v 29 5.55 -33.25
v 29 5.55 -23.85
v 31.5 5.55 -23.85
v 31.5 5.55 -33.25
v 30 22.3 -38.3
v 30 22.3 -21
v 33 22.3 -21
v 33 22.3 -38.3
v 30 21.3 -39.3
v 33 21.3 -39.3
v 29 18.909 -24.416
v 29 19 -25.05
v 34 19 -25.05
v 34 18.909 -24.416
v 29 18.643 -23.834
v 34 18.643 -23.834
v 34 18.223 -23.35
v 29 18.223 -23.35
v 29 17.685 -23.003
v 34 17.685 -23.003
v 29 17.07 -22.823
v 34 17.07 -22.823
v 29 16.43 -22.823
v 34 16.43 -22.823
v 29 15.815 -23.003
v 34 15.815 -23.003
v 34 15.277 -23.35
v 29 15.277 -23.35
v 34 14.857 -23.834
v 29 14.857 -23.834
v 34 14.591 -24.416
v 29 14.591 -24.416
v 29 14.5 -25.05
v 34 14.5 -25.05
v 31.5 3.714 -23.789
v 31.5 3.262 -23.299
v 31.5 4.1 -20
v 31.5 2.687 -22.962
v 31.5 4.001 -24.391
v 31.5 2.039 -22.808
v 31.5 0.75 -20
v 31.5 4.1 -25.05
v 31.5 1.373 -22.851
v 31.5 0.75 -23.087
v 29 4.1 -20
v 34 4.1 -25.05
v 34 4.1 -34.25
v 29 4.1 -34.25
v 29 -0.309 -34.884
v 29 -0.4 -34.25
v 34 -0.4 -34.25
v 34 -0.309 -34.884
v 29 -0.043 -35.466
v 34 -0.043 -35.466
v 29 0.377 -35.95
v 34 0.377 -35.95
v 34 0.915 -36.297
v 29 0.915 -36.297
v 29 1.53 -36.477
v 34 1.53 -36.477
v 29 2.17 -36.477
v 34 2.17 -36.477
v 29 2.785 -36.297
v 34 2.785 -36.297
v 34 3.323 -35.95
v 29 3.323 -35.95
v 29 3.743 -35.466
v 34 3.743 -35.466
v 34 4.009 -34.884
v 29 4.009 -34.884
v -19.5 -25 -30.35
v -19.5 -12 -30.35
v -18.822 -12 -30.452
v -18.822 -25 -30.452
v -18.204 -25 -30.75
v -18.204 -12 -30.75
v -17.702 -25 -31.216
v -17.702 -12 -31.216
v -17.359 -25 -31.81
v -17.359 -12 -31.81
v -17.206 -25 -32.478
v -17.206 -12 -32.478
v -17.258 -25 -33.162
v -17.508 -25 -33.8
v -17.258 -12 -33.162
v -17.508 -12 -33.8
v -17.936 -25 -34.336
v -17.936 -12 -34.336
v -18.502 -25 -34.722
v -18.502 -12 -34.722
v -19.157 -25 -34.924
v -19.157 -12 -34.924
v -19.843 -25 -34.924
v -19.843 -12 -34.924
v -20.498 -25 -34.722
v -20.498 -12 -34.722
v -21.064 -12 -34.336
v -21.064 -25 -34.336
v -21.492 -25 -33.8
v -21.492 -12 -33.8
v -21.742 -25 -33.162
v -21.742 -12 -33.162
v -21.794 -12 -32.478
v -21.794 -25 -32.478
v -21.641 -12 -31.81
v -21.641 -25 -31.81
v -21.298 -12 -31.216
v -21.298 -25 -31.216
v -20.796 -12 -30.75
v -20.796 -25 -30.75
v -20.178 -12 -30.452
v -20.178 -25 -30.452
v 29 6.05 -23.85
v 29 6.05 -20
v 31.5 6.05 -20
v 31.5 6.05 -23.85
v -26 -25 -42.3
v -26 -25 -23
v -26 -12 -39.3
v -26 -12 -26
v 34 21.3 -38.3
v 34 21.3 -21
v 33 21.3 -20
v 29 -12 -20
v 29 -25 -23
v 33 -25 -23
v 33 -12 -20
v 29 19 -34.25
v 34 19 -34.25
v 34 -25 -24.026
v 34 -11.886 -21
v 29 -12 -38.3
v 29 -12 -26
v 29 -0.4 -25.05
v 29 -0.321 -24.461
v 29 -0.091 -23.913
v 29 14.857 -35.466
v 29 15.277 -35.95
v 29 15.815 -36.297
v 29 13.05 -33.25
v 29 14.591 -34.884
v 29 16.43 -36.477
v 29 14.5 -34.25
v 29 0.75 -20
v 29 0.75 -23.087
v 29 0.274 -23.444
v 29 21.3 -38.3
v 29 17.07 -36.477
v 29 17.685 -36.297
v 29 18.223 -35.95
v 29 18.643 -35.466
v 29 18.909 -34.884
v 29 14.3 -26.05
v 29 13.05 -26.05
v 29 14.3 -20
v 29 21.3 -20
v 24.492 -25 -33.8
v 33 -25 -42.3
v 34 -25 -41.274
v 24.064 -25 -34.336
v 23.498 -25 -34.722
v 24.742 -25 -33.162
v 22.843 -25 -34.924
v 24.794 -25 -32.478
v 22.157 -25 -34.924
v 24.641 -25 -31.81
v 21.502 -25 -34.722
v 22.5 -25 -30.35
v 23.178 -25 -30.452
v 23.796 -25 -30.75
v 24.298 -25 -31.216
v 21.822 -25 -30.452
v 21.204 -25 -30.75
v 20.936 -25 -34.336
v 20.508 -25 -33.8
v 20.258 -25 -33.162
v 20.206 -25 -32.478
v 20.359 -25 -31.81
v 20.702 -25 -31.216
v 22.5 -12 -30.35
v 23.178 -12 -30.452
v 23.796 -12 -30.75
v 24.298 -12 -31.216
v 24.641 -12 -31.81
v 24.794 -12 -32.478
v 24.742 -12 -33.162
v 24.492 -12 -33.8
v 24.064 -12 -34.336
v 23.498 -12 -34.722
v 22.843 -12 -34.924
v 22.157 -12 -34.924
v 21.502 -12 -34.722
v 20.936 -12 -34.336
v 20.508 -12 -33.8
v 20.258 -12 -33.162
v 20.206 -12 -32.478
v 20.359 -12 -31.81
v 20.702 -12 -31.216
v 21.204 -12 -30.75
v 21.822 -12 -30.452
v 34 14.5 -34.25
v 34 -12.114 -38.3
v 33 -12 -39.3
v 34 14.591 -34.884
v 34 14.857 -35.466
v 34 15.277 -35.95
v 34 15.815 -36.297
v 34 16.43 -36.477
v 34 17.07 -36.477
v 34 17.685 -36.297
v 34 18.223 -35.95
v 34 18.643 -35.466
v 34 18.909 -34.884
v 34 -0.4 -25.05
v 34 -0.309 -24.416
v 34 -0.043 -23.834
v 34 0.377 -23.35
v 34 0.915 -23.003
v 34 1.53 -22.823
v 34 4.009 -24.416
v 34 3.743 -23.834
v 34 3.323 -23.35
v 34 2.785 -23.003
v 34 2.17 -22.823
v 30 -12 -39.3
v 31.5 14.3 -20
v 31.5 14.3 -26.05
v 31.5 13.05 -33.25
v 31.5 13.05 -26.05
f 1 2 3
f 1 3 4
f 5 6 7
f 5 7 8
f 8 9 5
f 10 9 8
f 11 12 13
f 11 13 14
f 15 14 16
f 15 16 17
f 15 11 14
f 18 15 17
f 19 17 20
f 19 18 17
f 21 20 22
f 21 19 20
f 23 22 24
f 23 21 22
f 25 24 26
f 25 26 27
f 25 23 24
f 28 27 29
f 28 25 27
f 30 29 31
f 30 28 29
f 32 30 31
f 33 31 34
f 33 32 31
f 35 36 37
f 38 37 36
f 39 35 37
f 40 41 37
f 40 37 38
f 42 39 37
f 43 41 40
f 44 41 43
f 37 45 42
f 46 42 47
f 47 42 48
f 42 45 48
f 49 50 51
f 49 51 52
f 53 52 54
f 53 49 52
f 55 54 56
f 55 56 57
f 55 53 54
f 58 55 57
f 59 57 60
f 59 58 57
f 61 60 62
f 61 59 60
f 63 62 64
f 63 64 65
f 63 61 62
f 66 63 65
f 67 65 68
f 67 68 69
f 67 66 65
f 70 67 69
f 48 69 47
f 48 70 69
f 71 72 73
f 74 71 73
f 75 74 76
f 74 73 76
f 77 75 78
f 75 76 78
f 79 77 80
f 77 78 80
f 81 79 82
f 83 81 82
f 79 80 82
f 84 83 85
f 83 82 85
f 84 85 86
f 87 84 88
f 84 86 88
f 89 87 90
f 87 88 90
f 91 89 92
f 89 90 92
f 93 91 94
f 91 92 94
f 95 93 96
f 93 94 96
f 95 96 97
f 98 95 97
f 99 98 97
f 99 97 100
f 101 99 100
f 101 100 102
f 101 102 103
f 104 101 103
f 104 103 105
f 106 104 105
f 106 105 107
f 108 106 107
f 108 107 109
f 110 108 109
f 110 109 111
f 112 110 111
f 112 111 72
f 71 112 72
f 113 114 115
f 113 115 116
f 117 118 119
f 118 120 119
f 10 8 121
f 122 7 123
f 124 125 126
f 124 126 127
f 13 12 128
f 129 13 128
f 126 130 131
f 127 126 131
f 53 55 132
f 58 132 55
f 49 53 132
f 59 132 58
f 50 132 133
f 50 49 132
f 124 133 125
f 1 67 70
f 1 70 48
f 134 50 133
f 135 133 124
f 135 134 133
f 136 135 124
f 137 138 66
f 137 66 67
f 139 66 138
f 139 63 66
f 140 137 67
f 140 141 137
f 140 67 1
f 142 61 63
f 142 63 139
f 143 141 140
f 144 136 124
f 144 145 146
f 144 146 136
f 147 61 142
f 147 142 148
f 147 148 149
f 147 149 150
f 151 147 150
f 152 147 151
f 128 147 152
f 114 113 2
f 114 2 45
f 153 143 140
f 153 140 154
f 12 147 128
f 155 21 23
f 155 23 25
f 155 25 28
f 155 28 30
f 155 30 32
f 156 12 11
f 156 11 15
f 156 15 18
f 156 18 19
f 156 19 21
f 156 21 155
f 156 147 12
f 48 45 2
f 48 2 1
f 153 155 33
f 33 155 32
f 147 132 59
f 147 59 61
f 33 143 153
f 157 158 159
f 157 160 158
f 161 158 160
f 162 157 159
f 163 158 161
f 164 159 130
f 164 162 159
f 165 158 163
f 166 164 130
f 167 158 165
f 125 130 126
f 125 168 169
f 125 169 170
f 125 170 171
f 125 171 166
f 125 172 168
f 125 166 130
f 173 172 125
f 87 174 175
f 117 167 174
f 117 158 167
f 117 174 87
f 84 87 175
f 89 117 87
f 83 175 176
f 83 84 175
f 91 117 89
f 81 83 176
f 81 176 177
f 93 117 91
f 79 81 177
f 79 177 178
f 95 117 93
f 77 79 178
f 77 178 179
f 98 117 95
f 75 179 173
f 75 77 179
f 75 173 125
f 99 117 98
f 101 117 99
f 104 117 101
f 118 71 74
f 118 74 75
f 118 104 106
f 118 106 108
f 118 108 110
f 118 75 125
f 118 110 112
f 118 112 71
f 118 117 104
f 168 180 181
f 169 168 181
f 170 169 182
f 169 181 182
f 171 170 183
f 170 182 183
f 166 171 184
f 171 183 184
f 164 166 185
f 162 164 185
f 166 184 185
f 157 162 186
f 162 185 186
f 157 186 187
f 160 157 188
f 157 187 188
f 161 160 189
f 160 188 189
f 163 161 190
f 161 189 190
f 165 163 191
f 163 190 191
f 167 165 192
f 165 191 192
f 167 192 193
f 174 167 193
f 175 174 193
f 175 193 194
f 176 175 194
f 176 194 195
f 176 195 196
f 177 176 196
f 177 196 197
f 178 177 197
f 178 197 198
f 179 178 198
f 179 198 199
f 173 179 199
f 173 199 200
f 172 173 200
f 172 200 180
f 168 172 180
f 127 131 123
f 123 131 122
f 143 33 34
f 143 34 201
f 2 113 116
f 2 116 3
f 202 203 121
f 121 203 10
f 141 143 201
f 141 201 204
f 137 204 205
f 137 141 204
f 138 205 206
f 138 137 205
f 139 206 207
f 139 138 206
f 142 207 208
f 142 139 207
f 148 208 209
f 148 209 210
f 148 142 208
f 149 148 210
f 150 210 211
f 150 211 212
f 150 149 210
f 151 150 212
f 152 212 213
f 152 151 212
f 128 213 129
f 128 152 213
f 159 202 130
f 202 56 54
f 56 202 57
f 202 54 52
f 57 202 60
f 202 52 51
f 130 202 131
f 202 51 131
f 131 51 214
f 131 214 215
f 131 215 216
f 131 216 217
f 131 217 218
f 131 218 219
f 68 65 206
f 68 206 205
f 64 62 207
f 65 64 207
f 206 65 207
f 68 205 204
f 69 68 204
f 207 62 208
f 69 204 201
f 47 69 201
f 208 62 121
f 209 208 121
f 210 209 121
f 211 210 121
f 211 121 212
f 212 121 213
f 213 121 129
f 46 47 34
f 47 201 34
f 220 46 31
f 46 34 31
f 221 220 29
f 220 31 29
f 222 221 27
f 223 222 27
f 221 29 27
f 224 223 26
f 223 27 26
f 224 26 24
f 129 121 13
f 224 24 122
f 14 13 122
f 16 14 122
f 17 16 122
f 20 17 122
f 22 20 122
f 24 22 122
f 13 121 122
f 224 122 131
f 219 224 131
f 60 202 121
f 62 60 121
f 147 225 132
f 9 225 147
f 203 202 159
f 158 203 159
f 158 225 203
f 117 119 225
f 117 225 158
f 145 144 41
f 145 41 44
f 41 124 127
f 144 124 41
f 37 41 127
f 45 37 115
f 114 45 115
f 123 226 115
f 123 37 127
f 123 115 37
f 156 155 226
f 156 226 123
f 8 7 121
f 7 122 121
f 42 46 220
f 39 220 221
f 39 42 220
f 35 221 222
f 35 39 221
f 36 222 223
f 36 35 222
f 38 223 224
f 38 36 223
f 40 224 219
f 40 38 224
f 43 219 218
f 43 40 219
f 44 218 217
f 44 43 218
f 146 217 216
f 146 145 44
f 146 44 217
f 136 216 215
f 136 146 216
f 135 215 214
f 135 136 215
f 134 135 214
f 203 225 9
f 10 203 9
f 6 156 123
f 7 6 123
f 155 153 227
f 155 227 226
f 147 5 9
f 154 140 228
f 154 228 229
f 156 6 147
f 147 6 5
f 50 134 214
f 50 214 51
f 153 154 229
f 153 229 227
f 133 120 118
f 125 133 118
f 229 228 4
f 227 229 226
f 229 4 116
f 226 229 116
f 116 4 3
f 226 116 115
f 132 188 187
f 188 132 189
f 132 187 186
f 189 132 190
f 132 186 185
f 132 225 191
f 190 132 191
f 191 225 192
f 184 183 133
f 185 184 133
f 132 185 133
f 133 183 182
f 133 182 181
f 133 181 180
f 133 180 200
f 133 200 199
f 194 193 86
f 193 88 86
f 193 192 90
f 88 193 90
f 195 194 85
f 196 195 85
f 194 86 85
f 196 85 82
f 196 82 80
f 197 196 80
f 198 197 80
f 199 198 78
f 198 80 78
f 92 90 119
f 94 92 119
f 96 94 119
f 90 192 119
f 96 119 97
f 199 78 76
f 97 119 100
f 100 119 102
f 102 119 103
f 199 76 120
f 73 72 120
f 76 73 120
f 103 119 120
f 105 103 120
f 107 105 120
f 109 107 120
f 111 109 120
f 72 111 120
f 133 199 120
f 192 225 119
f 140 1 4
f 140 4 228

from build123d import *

# Parameters (mm, degrees)
PAD_DEPTH            = 55
SKETCH001_R          = 2.3
POCKET_DEPTH         = 13.001
PAD013_DEPTH         = 5
SKETCH023_W          = 7.25
SKETCH023_H          = 3.35
POCKET009_DEPTH      = 2.5
CHAMFER005_SIZE      = 1
BODY_PITCH_ANGLE     = 90
BODY_PLACEMENT_ANGLE = 90


with BuildPart() as part:
    # Sketch → Pad (new body)
    with BuildSketch(Plane.XZ):
        Polygon((0, 0), (19.3, 0), (16.3, 13), (3, 13), align=None)
    extrude(amount=PAD_DEPTH)

    # Sketch001 (on Face3 of Pad) → Pocket (cut, through all)
    with BuildSketch(Plane(origin=(0, 0, 13), x_dir=(-1, 0, 0), z_dir=(0, 0, 1))):
        with Locations((-9.65, 6.5)):
            Circle(SKETCH001_R)
        with Locations((-9.65, 48.5)):
            Circle(SKETCH001_R)
    extrude(amount=-POCKET_DEPTH, mode=Mode.SUBTRACT)

    # Sketch022 (on Face4 of Pocket) → Pad013 (join)
    with BuildSketch(Plane.XZ.offset(55)):
        Polygon((16.3, 13), (19.3, 0), (0, 0), (-3, 13), (-3, 47.3), (16.3, 47.3), (16.3, 44.3), (16.3, 24.3), (16.3, 18.3), align=None)
        with BuildLine():
            ThreePointArc((2.05, 44), (-0.2, 41.75), (2.05, 39.5))
            Line((2.05, 39.5), (11.25, 39.5))
            ThreePointArc((11.25, 39.5), (13.5, 41.75), (11.25, 44))
            Line((2.05, 44), (11.25, 44))
        make_face(mode=Mode.SUBTRACT)
        with BuildLine():
            ThreePointArc((2.05, 29.1), (-0.2, 26.85), (2.05, 24.6))
            Line((2.05, 24.6), (11.25, 24.6))
            ThreePointArc((11.25, 24.6), (13.5, 26.85), (11.25, 29.1))
            Line((2.05, 29.1), (11.25, 29.1))
        make_face(mode=Mode.SUBTRACT)
    extrude(amount=PAD013_DEPTH)

    # Sketch023 (on Face6 of Pad013) → Pocket009 (cut)
    with BuildSketch(Plane(origin=(0, -55, 0), x_dir=(1, 0, 0), z_dir=(0, 1, 0))):
        Polygon((10.25, -30.55), (10.25, -38.05), (3.05, -38.05), (3.05, -39.3), (-3, -39.3), (-3, -31.05), (0.85, -31.05), (0.85, -30.55), align=None)
        with Locations((0.625, -27.425)):
            Rectangle(SKETCH023_W, SKETCH023_H)
    extrude(amount=-POCKET009_DEPTH, mode=Mode.SUBTRACT)

    # Chamfer005
    chamfer005_edges = [part.edges().sort_by_distance(p)[0] for p in [
        (16.3, -57.5, 47.3),
        (6.65, -60, 47.3),
        (6.65, -55, 47.3),
        (-3, -57.5, 47.3),
        (-3, -60, 30.15),
        (16.3, -60, 30.15),
        (-1.5, -60, 6.5),
        (17.8, -60, 6.5),
        (16.3, -55, 30.15),
    ]]
    chamfer(chamfer005_edges, length=CHAMFER005_SIZE)


with BuildPart() as part_1:
    # Body pitch: moved
    add(part.part.rotate(Axis((0, 0, 0), (0, 1, 0)), BODY_PITCH_ANGLE))


with BuildPart() as part_2:
    # Body placement: moved
    add(part_1.part.moved(Location((-26, -25, -23))).rotate(Axis((-26, -25, -23), (0, 0, 1)), BODY_PLACEMENT_ANGLE))


solid = part_2.part
